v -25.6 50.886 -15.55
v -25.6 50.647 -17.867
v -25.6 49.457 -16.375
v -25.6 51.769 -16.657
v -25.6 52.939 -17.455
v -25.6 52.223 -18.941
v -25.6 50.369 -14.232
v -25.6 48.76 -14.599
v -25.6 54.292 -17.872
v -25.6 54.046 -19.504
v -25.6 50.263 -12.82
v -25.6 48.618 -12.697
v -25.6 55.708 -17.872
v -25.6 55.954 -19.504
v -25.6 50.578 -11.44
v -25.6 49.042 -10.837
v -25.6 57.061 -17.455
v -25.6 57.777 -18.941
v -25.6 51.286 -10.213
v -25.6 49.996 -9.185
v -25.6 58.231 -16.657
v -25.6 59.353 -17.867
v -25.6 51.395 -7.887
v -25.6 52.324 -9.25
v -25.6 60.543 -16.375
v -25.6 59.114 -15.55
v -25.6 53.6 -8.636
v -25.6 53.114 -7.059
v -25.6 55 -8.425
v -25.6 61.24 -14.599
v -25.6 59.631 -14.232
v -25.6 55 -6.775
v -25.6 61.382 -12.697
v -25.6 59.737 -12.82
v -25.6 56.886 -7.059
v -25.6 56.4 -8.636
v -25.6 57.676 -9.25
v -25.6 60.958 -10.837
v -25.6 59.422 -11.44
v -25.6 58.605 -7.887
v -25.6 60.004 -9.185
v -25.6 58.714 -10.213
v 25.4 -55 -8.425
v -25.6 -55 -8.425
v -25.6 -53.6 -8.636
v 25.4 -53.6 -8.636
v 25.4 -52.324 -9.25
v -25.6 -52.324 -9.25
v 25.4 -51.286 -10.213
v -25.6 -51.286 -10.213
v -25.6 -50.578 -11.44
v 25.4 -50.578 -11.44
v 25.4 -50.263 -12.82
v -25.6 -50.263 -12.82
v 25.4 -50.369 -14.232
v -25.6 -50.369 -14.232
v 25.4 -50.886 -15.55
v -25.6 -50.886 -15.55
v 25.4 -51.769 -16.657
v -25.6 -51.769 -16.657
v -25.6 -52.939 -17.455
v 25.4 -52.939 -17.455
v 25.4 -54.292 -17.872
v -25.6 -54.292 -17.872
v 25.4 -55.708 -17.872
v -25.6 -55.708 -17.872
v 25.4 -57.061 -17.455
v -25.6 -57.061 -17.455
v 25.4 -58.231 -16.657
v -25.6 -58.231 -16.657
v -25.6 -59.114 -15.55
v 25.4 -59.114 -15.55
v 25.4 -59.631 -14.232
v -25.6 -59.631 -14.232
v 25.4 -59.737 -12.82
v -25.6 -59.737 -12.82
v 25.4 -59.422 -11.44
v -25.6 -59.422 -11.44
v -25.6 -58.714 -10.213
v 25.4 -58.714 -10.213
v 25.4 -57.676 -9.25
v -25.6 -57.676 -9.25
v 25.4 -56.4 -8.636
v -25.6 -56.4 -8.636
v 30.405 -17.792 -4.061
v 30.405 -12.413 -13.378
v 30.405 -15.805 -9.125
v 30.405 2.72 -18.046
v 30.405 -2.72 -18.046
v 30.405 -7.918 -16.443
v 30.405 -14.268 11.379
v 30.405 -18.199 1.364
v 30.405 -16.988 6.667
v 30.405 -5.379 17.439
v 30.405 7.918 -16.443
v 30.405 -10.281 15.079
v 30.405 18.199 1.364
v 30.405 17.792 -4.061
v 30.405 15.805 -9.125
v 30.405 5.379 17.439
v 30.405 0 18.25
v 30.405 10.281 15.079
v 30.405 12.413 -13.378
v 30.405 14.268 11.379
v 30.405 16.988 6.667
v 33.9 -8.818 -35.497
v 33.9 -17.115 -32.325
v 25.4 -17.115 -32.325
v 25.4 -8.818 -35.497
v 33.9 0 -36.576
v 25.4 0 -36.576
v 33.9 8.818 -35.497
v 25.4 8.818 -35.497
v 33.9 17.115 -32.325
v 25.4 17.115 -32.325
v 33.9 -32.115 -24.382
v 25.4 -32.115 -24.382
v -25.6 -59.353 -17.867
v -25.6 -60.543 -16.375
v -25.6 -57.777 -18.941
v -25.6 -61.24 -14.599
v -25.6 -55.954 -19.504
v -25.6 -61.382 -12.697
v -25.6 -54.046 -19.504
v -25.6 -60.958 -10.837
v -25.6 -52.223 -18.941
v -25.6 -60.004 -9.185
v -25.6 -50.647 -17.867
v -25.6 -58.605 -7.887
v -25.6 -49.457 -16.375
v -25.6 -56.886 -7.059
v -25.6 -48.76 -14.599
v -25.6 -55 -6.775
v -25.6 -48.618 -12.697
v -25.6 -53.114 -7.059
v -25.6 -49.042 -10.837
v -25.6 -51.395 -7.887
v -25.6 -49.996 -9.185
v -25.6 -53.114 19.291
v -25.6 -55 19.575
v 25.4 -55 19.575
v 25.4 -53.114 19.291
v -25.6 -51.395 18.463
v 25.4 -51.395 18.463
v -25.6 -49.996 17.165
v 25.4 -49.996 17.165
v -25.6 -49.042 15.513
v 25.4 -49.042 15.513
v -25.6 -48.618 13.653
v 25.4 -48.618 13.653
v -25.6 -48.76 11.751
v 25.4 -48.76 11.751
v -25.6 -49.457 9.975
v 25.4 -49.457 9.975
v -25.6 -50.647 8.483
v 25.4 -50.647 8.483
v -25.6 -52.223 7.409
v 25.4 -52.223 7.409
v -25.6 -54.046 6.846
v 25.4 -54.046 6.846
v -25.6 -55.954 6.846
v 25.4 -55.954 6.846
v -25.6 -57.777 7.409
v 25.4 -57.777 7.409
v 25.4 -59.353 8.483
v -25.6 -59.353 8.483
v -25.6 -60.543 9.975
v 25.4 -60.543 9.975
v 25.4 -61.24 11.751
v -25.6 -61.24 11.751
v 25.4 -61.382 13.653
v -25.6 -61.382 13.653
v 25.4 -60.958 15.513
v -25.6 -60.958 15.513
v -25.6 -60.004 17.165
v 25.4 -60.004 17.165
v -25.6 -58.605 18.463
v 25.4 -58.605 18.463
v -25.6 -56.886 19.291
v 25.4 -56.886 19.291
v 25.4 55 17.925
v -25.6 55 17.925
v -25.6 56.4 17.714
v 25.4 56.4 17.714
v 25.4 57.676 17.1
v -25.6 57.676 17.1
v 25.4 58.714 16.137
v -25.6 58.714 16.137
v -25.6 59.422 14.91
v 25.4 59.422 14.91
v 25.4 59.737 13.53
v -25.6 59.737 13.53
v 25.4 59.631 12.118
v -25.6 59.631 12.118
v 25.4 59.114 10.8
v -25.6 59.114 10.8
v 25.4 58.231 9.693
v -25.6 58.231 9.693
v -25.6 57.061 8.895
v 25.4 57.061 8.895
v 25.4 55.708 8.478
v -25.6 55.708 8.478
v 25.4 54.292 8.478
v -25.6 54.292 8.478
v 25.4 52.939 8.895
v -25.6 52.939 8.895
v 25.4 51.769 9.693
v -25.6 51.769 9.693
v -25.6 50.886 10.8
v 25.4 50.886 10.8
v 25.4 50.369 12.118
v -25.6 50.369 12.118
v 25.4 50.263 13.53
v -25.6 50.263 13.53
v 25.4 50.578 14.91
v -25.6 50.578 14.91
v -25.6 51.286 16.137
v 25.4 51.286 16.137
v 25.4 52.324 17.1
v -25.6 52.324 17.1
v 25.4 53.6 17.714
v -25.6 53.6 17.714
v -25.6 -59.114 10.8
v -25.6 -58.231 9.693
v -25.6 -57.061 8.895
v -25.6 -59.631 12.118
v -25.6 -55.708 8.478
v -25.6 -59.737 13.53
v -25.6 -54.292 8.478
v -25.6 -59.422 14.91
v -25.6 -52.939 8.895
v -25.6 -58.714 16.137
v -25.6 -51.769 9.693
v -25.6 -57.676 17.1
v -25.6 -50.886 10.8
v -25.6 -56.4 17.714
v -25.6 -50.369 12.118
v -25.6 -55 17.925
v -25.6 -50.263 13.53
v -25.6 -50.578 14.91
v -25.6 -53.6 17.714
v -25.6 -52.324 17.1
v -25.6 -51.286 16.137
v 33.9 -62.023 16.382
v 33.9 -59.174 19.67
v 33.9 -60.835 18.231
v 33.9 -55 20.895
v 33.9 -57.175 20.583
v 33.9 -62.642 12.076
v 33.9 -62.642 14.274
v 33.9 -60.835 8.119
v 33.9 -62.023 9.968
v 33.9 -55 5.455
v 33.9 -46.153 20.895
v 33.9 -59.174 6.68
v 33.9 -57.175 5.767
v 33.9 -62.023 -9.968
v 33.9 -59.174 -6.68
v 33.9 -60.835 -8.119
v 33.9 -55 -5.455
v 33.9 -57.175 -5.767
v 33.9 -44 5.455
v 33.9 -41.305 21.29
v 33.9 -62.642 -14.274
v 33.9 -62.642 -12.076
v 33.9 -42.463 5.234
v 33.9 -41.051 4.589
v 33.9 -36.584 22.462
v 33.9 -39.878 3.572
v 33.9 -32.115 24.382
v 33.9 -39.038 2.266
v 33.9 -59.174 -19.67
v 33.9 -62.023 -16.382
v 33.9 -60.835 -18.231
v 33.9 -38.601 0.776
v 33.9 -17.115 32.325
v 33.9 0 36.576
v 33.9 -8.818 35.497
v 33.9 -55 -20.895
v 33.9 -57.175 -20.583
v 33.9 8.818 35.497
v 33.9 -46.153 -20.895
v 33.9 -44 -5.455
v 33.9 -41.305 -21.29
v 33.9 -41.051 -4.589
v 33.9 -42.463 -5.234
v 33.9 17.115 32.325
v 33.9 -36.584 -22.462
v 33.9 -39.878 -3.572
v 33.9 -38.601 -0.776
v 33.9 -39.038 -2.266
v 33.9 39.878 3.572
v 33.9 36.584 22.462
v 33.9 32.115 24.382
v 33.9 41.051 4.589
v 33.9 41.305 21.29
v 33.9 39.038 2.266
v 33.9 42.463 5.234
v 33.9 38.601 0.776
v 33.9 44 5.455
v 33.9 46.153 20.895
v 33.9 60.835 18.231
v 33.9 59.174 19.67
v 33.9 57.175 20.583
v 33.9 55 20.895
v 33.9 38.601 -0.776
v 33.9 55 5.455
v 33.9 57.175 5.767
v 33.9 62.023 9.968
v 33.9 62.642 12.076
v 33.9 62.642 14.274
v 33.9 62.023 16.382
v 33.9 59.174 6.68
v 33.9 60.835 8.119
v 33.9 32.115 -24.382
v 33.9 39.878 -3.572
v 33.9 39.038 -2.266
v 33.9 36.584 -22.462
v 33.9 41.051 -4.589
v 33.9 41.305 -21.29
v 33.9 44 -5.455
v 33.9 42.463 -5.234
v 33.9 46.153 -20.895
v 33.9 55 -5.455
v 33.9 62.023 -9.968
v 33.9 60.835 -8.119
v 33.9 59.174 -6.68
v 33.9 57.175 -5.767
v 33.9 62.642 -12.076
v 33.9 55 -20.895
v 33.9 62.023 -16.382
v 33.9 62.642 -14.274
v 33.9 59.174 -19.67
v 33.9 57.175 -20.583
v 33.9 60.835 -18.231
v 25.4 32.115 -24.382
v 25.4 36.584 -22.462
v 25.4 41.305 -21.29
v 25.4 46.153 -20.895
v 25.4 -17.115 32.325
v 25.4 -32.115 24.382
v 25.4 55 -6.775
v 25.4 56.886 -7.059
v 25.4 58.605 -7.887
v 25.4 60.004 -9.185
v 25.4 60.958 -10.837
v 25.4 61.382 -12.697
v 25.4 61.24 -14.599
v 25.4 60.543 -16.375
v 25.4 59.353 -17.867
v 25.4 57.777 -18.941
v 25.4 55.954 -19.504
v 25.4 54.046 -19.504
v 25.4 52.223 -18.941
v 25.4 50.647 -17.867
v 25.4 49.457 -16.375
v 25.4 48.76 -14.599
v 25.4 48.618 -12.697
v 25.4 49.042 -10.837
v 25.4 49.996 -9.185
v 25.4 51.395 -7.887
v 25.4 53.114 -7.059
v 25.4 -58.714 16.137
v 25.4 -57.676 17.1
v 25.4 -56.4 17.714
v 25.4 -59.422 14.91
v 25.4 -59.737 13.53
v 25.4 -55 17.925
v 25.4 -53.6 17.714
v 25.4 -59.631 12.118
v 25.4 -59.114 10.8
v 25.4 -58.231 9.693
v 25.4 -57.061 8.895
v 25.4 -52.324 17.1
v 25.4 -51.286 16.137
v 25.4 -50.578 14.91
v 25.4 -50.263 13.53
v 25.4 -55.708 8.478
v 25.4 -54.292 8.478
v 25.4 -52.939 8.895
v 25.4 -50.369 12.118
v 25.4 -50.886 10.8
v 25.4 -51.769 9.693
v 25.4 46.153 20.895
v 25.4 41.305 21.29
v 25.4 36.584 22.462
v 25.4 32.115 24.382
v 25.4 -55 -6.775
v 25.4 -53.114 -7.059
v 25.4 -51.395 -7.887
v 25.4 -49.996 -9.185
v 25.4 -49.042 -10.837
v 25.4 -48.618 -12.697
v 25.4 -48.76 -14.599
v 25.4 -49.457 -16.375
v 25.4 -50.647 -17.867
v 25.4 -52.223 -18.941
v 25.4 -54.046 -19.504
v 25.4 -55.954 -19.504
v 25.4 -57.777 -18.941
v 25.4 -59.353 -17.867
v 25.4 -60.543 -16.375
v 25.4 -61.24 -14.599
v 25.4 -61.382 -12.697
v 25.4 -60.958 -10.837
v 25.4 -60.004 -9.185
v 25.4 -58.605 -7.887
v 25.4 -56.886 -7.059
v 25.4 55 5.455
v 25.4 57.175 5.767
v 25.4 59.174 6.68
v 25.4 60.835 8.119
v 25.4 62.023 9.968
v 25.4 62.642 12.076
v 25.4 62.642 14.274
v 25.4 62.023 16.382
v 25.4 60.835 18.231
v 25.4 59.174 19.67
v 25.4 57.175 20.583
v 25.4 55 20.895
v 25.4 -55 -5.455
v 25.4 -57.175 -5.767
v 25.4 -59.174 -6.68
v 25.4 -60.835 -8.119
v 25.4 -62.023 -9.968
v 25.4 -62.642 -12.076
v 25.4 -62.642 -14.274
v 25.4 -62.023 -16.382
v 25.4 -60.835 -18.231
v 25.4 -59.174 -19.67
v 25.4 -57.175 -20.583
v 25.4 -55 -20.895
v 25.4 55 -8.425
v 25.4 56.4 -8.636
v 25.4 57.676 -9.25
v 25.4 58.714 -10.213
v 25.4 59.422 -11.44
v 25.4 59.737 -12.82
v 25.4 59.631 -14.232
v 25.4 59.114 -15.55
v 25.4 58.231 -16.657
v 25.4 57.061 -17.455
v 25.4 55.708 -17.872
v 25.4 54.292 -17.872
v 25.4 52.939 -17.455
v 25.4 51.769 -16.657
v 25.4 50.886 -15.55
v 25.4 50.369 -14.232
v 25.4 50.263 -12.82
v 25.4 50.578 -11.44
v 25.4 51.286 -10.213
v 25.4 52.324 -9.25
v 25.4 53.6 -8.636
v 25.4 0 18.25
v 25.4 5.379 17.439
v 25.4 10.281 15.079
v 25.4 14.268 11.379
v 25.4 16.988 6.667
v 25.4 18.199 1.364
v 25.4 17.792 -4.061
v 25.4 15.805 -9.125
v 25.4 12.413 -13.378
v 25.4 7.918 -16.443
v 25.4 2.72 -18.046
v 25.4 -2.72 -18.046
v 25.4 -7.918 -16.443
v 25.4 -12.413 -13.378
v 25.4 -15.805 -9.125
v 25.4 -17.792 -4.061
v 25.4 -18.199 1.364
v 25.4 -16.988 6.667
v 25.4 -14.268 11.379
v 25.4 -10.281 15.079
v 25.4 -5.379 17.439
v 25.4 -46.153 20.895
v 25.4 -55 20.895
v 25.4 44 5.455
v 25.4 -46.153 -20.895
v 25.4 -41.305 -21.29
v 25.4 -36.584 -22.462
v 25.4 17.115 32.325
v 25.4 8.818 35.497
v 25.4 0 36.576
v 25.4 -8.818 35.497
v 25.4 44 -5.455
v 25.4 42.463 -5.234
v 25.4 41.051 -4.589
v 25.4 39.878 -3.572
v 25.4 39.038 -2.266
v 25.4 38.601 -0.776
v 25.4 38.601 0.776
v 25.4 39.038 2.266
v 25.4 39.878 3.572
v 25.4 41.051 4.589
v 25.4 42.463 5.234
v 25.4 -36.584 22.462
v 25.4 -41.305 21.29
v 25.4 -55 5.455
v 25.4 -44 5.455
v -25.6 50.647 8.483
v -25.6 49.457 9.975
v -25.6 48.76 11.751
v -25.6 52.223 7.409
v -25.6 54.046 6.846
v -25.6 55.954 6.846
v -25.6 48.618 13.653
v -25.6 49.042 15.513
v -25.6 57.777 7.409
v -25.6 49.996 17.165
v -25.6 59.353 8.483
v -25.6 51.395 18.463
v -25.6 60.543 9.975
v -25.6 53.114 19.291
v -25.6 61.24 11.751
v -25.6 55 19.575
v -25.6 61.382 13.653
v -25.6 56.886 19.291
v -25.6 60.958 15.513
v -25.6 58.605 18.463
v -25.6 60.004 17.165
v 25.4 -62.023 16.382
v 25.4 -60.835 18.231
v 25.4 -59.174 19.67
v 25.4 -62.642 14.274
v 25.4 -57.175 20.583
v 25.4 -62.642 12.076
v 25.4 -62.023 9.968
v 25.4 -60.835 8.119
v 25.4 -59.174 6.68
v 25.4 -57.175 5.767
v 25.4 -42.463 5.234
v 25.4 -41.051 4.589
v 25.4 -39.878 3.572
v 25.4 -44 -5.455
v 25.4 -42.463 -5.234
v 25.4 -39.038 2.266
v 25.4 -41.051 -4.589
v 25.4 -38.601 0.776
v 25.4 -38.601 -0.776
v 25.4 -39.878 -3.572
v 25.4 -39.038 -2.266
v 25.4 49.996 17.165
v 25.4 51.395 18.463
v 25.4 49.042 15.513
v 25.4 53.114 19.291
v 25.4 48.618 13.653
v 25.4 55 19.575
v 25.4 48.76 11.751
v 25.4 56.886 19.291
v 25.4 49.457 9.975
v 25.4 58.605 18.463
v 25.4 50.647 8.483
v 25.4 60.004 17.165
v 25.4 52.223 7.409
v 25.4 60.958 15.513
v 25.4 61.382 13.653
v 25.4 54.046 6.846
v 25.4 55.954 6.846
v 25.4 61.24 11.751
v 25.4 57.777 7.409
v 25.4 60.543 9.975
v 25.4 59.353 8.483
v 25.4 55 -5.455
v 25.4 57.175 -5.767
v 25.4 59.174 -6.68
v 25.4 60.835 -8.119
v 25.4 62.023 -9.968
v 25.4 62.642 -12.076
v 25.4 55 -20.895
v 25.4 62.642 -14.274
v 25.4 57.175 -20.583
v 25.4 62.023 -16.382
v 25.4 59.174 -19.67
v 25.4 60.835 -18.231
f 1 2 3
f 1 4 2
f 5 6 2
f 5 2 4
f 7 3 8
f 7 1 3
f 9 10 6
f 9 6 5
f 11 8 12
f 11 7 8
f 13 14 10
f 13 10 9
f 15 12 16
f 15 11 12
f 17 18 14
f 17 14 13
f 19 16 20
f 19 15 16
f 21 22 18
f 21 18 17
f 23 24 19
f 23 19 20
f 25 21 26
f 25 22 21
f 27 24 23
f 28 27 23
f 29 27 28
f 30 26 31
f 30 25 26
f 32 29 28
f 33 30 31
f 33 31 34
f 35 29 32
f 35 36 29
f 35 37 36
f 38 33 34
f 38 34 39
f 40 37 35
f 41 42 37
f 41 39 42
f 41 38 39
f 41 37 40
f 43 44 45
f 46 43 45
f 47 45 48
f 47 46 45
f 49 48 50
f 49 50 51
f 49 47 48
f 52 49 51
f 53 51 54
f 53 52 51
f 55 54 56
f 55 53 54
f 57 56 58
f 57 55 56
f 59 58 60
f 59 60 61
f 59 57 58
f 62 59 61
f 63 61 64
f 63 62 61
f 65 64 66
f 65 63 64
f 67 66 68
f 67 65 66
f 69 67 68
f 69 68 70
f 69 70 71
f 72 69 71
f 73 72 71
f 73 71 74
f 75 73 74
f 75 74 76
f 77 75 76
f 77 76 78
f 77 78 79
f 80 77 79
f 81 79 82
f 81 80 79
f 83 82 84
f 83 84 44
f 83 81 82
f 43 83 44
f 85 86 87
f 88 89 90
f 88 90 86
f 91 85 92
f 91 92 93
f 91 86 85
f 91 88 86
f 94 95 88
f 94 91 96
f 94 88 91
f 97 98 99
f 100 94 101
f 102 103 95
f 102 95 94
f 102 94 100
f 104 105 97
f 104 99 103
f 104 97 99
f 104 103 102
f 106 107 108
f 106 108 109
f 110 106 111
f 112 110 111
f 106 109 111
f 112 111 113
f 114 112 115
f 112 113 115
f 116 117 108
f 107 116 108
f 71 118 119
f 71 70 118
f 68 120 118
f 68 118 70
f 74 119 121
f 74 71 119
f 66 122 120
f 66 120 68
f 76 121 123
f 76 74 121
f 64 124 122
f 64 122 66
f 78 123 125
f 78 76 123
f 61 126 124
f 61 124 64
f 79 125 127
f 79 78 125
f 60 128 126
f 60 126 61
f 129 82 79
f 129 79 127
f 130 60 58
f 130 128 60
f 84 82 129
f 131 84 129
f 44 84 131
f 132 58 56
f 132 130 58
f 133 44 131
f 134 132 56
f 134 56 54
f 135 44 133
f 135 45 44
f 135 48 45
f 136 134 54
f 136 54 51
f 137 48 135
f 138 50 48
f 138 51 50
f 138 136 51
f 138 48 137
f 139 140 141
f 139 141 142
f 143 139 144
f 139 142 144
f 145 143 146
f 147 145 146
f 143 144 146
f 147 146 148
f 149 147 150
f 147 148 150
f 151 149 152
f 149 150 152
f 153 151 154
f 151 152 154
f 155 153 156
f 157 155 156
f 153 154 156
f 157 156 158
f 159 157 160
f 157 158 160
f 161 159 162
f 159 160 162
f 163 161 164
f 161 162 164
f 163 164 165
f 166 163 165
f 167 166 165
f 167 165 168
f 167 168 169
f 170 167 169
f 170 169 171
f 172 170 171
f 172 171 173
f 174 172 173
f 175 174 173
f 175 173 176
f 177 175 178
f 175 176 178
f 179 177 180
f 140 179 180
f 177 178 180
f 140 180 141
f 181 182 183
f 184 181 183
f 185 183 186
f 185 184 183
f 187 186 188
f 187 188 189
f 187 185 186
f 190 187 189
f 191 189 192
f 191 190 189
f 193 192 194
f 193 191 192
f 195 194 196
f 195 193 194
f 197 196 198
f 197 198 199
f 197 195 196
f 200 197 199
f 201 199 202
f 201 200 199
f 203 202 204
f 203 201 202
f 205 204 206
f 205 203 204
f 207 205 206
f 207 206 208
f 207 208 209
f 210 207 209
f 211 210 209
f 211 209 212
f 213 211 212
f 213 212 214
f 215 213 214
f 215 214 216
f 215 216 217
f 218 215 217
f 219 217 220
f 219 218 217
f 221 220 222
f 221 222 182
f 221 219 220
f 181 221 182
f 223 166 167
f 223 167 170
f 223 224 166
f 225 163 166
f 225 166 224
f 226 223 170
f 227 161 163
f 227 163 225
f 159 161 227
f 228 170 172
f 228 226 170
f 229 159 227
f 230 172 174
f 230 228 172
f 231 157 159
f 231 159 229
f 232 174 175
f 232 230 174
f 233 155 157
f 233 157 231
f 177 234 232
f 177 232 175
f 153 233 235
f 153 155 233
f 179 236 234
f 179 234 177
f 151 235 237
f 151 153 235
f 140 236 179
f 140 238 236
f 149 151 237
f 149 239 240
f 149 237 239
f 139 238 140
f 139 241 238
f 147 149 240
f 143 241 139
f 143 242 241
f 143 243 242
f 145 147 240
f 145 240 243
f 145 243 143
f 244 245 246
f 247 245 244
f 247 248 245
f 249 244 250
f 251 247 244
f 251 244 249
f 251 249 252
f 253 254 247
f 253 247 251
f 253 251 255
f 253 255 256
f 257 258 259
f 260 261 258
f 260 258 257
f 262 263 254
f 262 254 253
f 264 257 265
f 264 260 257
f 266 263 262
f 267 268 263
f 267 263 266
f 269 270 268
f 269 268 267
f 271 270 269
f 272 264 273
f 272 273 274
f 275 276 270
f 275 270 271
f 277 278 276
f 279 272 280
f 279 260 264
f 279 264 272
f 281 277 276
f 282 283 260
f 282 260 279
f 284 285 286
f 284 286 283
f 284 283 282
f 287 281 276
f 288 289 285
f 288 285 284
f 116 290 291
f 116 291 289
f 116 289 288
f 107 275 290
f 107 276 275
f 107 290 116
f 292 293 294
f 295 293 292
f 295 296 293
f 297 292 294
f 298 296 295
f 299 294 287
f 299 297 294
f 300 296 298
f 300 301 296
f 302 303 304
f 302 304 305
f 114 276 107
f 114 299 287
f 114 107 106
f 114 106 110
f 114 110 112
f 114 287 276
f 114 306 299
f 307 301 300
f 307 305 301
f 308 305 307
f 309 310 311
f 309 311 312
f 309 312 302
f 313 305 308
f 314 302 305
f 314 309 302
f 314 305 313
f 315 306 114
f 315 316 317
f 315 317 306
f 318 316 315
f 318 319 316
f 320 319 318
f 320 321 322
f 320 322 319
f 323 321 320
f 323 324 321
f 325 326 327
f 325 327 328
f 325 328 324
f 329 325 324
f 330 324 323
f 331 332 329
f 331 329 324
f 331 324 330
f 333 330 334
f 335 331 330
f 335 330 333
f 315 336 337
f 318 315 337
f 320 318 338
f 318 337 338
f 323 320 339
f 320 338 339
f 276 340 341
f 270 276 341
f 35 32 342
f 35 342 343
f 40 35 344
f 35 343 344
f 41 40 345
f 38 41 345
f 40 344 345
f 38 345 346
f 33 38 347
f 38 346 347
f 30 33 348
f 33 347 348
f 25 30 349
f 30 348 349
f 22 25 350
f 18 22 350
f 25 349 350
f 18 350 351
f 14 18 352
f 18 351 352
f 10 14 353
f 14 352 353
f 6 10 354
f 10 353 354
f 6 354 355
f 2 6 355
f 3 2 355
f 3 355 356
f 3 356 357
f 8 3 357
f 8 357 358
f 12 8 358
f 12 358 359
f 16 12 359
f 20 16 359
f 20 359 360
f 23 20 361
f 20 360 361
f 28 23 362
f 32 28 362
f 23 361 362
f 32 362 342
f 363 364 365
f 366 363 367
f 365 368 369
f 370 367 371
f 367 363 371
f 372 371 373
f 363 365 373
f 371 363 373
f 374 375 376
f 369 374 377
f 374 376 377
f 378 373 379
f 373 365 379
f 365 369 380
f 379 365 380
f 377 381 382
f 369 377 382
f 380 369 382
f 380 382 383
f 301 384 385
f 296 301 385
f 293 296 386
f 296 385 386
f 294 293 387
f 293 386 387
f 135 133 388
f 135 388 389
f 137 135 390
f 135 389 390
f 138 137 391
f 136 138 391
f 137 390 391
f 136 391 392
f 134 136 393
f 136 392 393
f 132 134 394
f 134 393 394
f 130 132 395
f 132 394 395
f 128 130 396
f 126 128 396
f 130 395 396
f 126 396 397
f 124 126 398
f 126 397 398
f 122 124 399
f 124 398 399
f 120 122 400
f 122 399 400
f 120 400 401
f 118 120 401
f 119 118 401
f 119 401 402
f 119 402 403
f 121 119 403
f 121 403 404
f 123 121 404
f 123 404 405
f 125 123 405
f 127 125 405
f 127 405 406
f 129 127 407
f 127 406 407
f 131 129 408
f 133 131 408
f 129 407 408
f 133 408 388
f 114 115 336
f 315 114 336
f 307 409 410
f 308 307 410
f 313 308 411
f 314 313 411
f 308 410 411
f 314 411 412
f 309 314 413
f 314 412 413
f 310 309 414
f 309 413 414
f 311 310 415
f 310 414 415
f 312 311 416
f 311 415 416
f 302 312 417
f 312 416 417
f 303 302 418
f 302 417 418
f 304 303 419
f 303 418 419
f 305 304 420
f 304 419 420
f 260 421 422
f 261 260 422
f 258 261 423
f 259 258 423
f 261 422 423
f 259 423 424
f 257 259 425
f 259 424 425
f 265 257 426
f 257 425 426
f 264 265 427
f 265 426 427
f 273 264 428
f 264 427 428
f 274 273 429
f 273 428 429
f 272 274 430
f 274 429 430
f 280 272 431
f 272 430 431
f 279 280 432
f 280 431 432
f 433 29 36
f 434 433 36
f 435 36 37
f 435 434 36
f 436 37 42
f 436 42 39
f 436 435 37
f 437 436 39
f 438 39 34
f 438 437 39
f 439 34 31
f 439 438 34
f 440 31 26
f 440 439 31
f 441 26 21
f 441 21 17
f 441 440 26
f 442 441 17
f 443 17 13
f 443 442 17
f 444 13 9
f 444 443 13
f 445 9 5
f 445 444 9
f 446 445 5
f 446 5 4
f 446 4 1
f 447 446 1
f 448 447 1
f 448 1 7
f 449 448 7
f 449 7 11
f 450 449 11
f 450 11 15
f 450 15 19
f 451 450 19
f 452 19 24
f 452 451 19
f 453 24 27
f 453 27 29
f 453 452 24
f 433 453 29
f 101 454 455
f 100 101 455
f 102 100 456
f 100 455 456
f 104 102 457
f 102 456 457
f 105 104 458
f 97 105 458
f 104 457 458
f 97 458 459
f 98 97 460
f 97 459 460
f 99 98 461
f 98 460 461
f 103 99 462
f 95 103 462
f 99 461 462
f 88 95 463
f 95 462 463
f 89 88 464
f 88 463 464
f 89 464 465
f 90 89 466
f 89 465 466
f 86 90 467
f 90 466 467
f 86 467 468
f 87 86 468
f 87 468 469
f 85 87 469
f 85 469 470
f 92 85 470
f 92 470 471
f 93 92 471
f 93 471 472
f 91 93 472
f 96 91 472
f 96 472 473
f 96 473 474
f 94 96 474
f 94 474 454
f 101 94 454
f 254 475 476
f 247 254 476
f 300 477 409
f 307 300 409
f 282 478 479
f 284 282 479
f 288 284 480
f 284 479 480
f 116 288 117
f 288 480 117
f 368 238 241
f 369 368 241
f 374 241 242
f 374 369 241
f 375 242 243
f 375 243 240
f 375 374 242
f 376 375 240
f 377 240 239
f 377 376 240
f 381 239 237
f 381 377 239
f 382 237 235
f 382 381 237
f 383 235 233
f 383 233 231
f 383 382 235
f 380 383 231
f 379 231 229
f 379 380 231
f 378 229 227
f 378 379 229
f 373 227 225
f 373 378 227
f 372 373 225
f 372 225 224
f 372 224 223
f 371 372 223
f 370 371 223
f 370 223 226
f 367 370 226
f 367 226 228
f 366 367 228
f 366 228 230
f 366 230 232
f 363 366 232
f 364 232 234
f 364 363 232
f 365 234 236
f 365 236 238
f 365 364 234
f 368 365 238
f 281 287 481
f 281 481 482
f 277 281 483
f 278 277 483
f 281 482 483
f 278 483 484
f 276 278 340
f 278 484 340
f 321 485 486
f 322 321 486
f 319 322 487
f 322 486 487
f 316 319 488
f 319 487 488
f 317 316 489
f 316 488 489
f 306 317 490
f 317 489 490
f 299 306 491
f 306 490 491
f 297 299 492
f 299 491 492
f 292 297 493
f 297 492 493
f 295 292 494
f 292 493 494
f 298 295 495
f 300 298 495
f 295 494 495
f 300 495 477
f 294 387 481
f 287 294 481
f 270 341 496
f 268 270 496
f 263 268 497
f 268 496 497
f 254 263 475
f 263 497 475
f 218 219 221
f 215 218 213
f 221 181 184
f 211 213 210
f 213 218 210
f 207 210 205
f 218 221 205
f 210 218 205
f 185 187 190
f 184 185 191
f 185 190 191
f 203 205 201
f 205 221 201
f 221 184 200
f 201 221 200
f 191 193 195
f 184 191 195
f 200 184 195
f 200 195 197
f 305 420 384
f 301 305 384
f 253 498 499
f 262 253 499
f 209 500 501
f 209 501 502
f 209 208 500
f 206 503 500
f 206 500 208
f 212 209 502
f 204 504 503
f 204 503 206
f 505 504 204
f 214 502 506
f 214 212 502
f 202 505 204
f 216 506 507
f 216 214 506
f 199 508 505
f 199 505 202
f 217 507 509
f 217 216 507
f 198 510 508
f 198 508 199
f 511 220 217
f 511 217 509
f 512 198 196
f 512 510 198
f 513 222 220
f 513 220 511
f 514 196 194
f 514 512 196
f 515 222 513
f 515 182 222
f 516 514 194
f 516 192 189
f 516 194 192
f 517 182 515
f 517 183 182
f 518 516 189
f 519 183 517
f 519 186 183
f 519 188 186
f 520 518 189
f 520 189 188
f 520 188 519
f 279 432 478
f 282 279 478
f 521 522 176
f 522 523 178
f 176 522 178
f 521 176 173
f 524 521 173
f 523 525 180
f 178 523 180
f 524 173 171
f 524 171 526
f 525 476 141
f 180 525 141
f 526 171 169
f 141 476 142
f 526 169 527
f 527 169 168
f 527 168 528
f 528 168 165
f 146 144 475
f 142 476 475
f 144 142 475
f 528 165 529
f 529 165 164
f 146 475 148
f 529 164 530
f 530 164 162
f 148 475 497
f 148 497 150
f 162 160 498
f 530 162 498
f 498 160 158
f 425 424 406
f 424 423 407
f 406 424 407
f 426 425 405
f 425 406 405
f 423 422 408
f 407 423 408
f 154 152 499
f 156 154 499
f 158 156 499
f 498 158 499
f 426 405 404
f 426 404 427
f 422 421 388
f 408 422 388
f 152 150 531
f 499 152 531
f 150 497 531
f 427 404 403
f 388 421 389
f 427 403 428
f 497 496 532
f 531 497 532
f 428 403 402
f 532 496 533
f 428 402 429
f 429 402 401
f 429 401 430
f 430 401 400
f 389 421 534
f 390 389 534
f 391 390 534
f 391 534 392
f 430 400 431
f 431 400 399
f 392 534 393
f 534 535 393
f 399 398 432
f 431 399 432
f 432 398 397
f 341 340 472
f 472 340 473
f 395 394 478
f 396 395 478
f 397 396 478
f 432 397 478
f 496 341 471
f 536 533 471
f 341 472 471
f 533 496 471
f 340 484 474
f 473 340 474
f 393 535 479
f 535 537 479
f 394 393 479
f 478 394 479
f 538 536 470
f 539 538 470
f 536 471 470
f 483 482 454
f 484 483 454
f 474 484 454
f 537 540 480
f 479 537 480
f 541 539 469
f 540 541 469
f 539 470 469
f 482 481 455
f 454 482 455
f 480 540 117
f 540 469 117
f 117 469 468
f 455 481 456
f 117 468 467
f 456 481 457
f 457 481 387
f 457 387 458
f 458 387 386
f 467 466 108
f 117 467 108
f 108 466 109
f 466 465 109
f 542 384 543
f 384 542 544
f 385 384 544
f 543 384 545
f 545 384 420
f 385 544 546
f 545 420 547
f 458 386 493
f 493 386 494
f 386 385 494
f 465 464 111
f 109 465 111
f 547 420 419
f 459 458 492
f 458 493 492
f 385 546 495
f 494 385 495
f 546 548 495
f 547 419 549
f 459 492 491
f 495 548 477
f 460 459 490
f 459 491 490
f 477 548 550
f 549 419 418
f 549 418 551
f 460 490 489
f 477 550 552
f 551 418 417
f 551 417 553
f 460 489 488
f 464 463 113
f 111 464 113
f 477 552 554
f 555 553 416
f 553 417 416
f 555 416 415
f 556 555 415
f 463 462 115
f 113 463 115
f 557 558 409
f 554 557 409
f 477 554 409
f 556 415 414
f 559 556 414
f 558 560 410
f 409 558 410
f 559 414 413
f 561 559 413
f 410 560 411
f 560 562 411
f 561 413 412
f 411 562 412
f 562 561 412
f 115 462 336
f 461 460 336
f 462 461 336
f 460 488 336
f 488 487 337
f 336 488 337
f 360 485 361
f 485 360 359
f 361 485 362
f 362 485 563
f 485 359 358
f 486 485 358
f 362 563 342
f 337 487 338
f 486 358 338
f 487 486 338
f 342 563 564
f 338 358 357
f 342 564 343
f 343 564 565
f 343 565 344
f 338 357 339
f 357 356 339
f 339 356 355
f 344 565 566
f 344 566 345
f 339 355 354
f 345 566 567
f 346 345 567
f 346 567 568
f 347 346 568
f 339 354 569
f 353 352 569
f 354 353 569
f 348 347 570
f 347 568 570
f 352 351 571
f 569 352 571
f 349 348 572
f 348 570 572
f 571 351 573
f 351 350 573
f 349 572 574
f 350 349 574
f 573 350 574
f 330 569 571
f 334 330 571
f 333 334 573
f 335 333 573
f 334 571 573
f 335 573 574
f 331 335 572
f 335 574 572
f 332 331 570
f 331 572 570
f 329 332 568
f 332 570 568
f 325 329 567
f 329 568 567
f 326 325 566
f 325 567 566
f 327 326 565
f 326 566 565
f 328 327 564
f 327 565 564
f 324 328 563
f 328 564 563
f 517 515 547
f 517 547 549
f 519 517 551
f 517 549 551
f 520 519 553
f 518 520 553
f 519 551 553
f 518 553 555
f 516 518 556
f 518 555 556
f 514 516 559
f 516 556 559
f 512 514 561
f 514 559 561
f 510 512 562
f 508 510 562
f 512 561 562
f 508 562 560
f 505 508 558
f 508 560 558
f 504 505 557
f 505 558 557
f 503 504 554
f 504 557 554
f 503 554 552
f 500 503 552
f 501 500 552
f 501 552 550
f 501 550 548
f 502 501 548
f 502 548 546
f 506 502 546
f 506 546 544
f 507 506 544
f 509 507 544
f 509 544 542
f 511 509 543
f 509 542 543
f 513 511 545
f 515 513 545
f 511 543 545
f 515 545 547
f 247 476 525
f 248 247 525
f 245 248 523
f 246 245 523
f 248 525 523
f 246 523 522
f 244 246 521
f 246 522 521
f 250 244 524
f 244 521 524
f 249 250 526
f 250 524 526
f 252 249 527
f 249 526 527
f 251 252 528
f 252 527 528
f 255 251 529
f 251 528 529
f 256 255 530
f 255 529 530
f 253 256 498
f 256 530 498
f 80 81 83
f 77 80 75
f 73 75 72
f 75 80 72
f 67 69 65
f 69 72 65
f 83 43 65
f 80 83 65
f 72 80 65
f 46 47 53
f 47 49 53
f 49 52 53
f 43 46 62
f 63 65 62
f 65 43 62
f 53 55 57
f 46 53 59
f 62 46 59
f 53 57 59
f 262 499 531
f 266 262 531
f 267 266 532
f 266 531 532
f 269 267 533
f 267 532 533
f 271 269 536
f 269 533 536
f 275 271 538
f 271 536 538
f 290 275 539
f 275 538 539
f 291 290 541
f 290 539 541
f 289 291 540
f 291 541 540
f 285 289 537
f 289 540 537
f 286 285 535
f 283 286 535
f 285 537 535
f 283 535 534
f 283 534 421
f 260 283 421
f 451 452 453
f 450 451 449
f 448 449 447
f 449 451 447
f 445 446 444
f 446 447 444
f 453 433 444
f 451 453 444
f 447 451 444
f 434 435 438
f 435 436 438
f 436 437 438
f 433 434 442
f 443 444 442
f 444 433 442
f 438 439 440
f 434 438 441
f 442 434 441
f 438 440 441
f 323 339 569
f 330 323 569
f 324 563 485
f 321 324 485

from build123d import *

# Parameters (mm, degrees)
SKETCH1_W           = 17.145
SKETCH1_H           = 18.25
SKETCH2_R           = 3.71475
CUT_EXTRUDE1_DEPTH  = 8.5725
SKETCH3_R           = 18.25
BOSS_EXTRUDE1_DEPTH = 8.5
SKETCH4_R           = 6.4
SKETCH4_R_2         = 4.75
BOSS_EXTRUDE2_DEPTH = 51
SKETCH5_R           = 18.25
CUT_EXTRUDE2_DEPTH  = 22.15


with BuildPart() as part:
    # Sketch1 → Revolve1 (revolve)
    with BuildSketch(Plane.XY):
        with Locations((16.8275, 9.125)):
            Rectangle(SKETCH1_W, SKETCH1_H)
    revolve(axis=Axis((8.255, 0, 0), (1, 0, 0)))

    # Sketch2 → Cut-Extrude1 (cut)
    with BuildSketch(Plane.ZY.offset(-8.255)):
        Circle(SKETCH2_R)
    extrude(amount=-CUT_EXTRUDE1_DEPTH, mode=Mode.SUBTRACT)


with BuildPart() as body_2:
    # Sketch3 → Boss-Extrude1 (new body)
    with BuildSketch(Plane(origin=(25.4, 0, 0), x_dir=(0, 0, -1), z_dir=(1, 0, 0))):
        with BuildLine():
            Line((-24.382347836, 32.115154563), (-32.324530318, 17.115154563))
            ThreePointArc((-32.324530318, 17.115154563), (-36.576, 0), (-32.324530318, -17.115154563))
            Line((-32.324530318, -17.115154563), (-24.382347836, -32.115154563))
            ThreePointArc((-24.382347836, -32.115154563), (-21.780072988, -38.920854003), (-20.89525, -46.153175037))
            Line((-20.89525, -46.153175037), (-20.89525, -55))
            ThreePointArc((-20.89525, -55), (-13.175, -62.72025), (-5.45475, -55))
            Line((-5.45475, -55), (-5.45475, -44))
            ThreePointArc((-5.45475, -44), (0, -38.54525), (5.45475, -44))
            Line((5.45475, -44), (5.45475, -55))
            ThreePointArc((5.45475, -55), (13.175, -62.72025), (20.89525, -55))
            Line((20.89525, -55), (20.89525, -46.153175037))
            ThreePointArc((20.89525, -46.153175037), (21.780072988, -38.920854003), (24.382347836, -32.115154563))
            Line((24.382347836, -32.115154563), (32.324530318, -17.115154563))
            ThreePointArc((32.324530318, -17.115154563), (36.576, 0), (32.324530318, 17.115154563))
            Line((32.324530318, 17.115154563), (24.382347836, 32.115154563))
            ThreePointArc((24.382347836, 32.115154563), (21.780072988, 38.920854003), (20.89525, 46.153175037))
            Line((20.89525, 46.153175037), (20.89525, 55))
            ThreePointArc((20.89525, 55), (13.175, 62.72025), (5.45475, 55))
            Line((5.45475, 55), (5.45475, 44))
            ThreePointArc((5.45475, 44), (0, 38.54525), (-5.45475, 44))
            Line((-5.45475, 44), (-5.45475, 55))
            ThreePointArc((-5.45475, 55), (-13.175, 62.72025), (-20.89525, 55))
            Line((-20.89525, 55), (-20.89525, 46.153175037))
            ThreePointArc((-20.89525, 46.153175037), (-21.780072988, 38.920854003), (-24.382347836, 32.115154563))
        make_face()
        Circle(SKETCH3_R, mode=Mode.SUBTRACT)
        Circle(SKETCH3_R)
    extrude(amount=BOSS_EXTRUDE1_DEPTH)

    # Sketch4 → Boss-Extrude2 (add)
    with BuildSketch(Plane.ZY.offset(-25.4)):
        with Locations((-13.175, 55)):
            Circle(SKETCH4_R)
        with Locations((-13.175, 55)):
            Circle(SKETCH4_R_2, mode=Mode.SUBTRACT)
        with Locations((13.175, 55)):
            Circle(SKETCH4_R)
        with Locations((13.175, 55)):
            Circle(SKETCH4_R_2, mode=Mode.SUBTRACT)
        with Locations((13.175, -55)):
            Circle(SKETCH4_R)
        with Locations((13.175, -55)):
            Circle(SKETCH4_R_2, mode=Mode.SUBTRACT)
        with Locations((-13.175, -55)):
            Circle(SKETCH4_R)
        with Locations((-13.175, -55)):
            Circle(SKETCH4_R_2, mode=Mode.SUBTRACT)
    extrude(amount=BOSS_EXTRUDE2_DEPTH)


with BuildPart() as cut_extrude2_tool:
    # Sketch5 → Cut-Extrude2 (new body)
    with BuildSketch(Plane.ZY.offset(-8.255)):
        Circle(SKETCH5_R)
    extrude(amount=-CUT_EXTRUDE2_DEPTH)


with BuildPart() as part_1:
    add(part.part)

    # Cut-Extrude2: cut by cut_extrude2_tool
    add(cut_extrude2_tool.part, mode=Mode.SUBTRACT)


with BuildPart() as body_2_1:
    add(body_2.part)

    # Cut-Extrude2: cut by cut_extrude2_tool
    add(cut_extrude2_tool.part, mode=Mode.SUBTRACT)


solid = body_2_1.part
